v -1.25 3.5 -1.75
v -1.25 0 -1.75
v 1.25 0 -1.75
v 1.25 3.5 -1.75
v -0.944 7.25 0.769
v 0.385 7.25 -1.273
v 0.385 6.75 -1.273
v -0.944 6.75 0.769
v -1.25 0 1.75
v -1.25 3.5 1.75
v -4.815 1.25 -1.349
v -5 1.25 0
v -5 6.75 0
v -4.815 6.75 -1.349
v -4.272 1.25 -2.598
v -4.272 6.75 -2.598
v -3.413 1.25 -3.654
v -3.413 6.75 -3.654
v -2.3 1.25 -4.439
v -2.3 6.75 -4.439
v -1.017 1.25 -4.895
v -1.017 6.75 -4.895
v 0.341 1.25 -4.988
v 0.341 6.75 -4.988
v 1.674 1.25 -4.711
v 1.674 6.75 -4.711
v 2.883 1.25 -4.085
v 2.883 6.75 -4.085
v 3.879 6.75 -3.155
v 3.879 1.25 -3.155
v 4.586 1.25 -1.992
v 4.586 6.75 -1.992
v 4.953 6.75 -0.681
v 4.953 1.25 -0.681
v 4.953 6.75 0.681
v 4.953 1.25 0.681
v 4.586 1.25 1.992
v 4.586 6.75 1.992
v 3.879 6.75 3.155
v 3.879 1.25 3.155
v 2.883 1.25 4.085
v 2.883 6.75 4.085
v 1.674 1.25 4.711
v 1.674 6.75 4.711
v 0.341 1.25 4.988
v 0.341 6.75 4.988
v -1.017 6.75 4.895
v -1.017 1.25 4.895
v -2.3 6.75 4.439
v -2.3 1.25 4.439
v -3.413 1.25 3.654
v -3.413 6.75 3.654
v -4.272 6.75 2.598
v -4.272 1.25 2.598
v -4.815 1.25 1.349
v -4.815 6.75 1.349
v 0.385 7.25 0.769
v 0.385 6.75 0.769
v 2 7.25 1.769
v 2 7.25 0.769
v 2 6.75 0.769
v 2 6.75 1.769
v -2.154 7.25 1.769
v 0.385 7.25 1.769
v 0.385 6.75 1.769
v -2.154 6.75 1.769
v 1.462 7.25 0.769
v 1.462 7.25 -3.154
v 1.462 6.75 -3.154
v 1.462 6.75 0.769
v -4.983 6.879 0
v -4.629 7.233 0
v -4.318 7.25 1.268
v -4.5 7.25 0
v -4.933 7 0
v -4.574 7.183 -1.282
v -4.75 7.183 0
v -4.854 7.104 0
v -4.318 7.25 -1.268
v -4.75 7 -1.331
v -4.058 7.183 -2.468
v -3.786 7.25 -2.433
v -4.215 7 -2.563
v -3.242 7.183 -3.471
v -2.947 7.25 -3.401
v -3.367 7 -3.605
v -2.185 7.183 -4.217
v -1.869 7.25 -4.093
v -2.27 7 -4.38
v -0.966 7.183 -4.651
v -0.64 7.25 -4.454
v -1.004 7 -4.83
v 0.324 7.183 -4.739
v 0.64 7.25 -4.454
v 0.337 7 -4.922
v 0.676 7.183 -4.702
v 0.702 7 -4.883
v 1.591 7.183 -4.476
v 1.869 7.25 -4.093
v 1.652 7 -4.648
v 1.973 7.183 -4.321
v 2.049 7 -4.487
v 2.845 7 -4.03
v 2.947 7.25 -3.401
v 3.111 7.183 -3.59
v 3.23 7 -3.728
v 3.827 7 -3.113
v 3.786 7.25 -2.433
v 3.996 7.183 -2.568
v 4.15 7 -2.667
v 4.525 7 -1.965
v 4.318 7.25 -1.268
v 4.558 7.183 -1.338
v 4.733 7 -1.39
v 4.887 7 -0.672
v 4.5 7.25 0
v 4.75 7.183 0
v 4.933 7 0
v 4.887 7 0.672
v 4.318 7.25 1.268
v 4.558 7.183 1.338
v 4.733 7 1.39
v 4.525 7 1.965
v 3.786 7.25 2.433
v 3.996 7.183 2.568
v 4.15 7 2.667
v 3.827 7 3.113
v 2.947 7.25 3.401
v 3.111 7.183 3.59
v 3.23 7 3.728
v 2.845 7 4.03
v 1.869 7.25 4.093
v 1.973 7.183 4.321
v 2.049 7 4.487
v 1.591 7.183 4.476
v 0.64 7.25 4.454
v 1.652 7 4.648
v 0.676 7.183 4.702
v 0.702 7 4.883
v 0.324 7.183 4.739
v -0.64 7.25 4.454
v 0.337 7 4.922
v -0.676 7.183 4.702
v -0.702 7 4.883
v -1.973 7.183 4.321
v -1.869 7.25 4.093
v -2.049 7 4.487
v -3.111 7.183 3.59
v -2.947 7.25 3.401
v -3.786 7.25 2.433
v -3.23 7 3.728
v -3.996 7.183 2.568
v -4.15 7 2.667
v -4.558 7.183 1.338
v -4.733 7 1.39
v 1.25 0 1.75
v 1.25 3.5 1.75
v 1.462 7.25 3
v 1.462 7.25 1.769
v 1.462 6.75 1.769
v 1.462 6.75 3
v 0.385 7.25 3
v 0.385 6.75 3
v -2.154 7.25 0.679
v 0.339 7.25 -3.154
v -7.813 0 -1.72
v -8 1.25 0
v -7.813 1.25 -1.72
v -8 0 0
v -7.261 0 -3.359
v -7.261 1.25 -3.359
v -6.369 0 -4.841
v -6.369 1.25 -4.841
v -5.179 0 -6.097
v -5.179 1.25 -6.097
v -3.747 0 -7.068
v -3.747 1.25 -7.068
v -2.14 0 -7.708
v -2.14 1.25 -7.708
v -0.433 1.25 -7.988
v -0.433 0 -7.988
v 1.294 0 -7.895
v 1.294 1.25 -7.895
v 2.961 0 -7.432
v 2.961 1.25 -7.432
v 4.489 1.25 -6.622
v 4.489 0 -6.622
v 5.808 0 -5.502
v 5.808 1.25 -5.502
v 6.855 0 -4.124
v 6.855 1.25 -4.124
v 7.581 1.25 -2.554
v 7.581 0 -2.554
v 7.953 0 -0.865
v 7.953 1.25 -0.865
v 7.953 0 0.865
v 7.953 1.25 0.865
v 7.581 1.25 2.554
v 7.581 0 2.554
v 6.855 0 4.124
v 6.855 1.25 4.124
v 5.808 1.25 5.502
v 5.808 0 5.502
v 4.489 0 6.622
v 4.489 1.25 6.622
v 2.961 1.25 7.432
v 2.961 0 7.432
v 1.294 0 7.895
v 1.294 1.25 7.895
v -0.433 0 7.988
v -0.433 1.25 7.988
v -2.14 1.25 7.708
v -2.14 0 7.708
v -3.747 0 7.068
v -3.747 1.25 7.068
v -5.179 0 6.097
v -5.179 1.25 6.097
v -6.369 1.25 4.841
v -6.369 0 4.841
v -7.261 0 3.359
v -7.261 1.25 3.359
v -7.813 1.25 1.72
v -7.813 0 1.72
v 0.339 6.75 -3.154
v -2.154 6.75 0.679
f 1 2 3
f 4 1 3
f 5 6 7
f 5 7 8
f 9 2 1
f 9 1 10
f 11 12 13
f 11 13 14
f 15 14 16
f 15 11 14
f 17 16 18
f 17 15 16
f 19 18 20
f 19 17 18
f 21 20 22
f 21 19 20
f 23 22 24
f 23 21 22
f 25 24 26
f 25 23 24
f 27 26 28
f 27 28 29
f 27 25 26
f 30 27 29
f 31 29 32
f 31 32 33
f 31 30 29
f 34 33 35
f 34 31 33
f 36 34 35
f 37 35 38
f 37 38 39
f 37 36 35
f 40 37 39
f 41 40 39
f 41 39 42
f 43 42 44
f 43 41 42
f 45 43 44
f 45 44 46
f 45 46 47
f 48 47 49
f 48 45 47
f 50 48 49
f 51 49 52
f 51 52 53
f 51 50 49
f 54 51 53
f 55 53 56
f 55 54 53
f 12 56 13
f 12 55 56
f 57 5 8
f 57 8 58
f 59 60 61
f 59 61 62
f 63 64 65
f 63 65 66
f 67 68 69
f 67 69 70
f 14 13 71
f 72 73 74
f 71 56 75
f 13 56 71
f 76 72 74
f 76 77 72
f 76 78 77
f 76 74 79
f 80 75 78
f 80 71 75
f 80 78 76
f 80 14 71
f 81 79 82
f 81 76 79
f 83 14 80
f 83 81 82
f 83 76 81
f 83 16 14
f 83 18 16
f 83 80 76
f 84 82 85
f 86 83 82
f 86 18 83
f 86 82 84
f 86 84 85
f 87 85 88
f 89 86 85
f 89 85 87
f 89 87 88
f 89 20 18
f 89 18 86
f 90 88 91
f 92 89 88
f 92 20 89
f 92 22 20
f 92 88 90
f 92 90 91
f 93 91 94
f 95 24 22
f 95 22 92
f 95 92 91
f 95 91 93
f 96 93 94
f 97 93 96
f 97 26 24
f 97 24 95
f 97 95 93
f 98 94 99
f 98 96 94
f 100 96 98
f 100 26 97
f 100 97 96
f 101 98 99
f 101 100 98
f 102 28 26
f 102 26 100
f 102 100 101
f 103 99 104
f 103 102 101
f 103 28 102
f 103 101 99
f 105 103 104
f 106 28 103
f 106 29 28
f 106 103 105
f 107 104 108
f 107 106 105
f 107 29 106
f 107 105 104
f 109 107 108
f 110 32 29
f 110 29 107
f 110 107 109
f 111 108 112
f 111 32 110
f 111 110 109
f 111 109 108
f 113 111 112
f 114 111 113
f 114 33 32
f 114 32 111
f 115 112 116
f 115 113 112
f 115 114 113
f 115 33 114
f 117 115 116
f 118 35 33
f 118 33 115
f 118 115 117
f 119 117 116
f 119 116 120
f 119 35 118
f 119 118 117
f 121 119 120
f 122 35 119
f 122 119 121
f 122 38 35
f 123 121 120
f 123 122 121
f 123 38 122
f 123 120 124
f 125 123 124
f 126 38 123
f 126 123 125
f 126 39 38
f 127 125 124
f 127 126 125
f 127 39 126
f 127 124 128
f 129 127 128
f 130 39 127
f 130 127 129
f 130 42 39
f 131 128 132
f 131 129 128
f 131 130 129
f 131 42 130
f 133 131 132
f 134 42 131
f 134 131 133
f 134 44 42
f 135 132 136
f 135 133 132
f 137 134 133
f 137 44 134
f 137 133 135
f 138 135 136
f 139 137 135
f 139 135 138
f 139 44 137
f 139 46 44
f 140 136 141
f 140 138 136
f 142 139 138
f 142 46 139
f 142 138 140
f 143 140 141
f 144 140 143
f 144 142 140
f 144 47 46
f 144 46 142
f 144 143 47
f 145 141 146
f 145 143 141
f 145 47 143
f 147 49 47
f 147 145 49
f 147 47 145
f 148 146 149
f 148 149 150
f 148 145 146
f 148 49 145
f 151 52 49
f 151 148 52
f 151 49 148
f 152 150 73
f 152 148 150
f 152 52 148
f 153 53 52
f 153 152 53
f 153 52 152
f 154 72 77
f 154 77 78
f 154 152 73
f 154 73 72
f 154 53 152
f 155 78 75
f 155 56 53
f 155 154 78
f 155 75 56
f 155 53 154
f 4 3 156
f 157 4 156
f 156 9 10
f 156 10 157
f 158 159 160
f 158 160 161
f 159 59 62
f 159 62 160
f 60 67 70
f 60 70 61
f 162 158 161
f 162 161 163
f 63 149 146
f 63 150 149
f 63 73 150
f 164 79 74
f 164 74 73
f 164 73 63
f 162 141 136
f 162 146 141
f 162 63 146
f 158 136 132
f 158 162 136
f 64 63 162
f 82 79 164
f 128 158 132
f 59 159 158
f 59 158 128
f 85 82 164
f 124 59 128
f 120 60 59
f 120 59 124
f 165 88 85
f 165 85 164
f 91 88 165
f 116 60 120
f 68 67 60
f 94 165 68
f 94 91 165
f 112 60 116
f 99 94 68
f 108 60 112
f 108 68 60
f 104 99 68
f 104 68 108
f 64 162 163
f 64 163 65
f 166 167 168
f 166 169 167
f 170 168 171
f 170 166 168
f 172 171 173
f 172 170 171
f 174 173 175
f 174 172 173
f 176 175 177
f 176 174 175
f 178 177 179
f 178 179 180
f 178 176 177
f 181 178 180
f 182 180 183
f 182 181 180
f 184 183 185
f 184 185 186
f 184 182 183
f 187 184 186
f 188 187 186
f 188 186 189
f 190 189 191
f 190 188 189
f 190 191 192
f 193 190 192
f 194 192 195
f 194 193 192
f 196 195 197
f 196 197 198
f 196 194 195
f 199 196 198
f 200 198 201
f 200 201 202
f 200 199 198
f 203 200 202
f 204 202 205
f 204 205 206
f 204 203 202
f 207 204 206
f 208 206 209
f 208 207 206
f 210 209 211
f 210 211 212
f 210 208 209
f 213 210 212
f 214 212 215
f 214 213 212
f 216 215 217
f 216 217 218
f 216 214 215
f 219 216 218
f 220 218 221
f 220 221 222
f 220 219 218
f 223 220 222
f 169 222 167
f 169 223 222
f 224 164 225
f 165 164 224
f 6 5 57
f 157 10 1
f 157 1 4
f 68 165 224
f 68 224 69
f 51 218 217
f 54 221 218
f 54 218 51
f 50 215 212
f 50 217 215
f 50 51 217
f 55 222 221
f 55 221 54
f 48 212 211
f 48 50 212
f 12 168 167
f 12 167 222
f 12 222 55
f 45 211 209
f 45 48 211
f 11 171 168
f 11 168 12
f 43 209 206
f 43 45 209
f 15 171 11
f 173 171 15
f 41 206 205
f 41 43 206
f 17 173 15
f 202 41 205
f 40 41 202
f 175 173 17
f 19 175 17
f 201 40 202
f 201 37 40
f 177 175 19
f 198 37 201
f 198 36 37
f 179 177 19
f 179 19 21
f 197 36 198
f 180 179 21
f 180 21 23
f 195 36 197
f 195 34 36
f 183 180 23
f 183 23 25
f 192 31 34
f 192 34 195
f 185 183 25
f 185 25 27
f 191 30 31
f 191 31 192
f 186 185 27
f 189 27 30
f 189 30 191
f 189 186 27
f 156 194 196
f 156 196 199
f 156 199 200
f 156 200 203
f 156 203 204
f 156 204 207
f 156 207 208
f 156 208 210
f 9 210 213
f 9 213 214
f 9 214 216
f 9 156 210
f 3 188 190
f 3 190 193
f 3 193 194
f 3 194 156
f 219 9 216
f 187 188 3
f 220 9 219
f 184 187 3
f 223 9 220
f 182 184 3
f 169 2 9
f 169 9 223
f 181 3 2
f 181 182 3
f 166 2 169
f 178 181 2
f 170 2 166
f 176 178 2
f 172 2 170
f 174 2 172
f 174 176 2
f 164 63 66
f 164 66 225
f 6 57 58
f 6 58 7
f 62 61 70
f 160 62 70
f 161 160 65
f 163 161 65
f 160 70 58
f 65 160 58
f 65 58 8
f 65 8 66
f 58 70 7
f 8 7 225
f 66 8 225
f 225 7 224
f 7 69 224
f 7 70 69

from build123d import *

# Parameters (mm, degrees)
SKETCH2_W          = 2.5
SKETCH2_H          = 3.5
CUT_EXTRUDE1_DEPTH = 3.5
FILLET1_R          = 0.5
CUT_EXTRUDE2_DEPTH = 0.5


with BuildPart() as part:
    # Sketch1 → Revolve1 (revolve)
    with BuildSketch(Plane.XY, mode=Mode.PRIVATE) as revolve1_sk:
        Polygon((0, 7.25), (5, 7.25), (5, 1.25), (8, 1.25), (8, 0), (0, 0), align=None)
    revolve(revolve1_sk.sketch.rotate(Axis((0, 7.25, 0), (0, -1, 0)), 180), axis=Axis((0, 7.25, 0), (0, -1, 0)))

    # Sketch2 → Cut-Extrude1 (cut)
    with BuildSketch(Plane.XZ):
        Rectangle(SKETCH2_W, SKETCH2_H)
    extrude(amount=-CUT_EXTRUDE1_DEPTH, mode=Mode.SUBTRACT)

    # Fillet1
    fillet1_edges = [part.edges().sort_by_distance(p)[0] for p in [
        (5, 7.25, 0),
    ]]
    fillet(fillet1_edges, radius=FILLET1_R)

    # Sketch3 → Cut-Extrude2 (cut)
    with BuildSketch(Plane(origin=(0, 7.25, 0), x_dir=(1, 0, 0), z_dir=(0, 1, 0))):
        Polygon((0.338942308, 3.153846154), (1.461538462, 3.153846154), (1.461538462, -0.769230769), (2, -0.769230769), (2, -1.769230769), (1.461538462, -1.769230769), (1.461538462, -3), (0.384615385, -3), (0.384615385, -1.769230769), (-2.153846154, -1.769230769), (-2.153846154, -0.679086538), align=None)
        Polygon((0.384615385, -0.769230769), (0.384615385, 1.272836538), (-0.943509615, -0.769230769), align=None, mode=Mode.SUBTRACT)
    extrude(amount=-CUT_EXTRUDE2_DEPTH, mode=Mode.SUBTRACT)


solid = part.part
